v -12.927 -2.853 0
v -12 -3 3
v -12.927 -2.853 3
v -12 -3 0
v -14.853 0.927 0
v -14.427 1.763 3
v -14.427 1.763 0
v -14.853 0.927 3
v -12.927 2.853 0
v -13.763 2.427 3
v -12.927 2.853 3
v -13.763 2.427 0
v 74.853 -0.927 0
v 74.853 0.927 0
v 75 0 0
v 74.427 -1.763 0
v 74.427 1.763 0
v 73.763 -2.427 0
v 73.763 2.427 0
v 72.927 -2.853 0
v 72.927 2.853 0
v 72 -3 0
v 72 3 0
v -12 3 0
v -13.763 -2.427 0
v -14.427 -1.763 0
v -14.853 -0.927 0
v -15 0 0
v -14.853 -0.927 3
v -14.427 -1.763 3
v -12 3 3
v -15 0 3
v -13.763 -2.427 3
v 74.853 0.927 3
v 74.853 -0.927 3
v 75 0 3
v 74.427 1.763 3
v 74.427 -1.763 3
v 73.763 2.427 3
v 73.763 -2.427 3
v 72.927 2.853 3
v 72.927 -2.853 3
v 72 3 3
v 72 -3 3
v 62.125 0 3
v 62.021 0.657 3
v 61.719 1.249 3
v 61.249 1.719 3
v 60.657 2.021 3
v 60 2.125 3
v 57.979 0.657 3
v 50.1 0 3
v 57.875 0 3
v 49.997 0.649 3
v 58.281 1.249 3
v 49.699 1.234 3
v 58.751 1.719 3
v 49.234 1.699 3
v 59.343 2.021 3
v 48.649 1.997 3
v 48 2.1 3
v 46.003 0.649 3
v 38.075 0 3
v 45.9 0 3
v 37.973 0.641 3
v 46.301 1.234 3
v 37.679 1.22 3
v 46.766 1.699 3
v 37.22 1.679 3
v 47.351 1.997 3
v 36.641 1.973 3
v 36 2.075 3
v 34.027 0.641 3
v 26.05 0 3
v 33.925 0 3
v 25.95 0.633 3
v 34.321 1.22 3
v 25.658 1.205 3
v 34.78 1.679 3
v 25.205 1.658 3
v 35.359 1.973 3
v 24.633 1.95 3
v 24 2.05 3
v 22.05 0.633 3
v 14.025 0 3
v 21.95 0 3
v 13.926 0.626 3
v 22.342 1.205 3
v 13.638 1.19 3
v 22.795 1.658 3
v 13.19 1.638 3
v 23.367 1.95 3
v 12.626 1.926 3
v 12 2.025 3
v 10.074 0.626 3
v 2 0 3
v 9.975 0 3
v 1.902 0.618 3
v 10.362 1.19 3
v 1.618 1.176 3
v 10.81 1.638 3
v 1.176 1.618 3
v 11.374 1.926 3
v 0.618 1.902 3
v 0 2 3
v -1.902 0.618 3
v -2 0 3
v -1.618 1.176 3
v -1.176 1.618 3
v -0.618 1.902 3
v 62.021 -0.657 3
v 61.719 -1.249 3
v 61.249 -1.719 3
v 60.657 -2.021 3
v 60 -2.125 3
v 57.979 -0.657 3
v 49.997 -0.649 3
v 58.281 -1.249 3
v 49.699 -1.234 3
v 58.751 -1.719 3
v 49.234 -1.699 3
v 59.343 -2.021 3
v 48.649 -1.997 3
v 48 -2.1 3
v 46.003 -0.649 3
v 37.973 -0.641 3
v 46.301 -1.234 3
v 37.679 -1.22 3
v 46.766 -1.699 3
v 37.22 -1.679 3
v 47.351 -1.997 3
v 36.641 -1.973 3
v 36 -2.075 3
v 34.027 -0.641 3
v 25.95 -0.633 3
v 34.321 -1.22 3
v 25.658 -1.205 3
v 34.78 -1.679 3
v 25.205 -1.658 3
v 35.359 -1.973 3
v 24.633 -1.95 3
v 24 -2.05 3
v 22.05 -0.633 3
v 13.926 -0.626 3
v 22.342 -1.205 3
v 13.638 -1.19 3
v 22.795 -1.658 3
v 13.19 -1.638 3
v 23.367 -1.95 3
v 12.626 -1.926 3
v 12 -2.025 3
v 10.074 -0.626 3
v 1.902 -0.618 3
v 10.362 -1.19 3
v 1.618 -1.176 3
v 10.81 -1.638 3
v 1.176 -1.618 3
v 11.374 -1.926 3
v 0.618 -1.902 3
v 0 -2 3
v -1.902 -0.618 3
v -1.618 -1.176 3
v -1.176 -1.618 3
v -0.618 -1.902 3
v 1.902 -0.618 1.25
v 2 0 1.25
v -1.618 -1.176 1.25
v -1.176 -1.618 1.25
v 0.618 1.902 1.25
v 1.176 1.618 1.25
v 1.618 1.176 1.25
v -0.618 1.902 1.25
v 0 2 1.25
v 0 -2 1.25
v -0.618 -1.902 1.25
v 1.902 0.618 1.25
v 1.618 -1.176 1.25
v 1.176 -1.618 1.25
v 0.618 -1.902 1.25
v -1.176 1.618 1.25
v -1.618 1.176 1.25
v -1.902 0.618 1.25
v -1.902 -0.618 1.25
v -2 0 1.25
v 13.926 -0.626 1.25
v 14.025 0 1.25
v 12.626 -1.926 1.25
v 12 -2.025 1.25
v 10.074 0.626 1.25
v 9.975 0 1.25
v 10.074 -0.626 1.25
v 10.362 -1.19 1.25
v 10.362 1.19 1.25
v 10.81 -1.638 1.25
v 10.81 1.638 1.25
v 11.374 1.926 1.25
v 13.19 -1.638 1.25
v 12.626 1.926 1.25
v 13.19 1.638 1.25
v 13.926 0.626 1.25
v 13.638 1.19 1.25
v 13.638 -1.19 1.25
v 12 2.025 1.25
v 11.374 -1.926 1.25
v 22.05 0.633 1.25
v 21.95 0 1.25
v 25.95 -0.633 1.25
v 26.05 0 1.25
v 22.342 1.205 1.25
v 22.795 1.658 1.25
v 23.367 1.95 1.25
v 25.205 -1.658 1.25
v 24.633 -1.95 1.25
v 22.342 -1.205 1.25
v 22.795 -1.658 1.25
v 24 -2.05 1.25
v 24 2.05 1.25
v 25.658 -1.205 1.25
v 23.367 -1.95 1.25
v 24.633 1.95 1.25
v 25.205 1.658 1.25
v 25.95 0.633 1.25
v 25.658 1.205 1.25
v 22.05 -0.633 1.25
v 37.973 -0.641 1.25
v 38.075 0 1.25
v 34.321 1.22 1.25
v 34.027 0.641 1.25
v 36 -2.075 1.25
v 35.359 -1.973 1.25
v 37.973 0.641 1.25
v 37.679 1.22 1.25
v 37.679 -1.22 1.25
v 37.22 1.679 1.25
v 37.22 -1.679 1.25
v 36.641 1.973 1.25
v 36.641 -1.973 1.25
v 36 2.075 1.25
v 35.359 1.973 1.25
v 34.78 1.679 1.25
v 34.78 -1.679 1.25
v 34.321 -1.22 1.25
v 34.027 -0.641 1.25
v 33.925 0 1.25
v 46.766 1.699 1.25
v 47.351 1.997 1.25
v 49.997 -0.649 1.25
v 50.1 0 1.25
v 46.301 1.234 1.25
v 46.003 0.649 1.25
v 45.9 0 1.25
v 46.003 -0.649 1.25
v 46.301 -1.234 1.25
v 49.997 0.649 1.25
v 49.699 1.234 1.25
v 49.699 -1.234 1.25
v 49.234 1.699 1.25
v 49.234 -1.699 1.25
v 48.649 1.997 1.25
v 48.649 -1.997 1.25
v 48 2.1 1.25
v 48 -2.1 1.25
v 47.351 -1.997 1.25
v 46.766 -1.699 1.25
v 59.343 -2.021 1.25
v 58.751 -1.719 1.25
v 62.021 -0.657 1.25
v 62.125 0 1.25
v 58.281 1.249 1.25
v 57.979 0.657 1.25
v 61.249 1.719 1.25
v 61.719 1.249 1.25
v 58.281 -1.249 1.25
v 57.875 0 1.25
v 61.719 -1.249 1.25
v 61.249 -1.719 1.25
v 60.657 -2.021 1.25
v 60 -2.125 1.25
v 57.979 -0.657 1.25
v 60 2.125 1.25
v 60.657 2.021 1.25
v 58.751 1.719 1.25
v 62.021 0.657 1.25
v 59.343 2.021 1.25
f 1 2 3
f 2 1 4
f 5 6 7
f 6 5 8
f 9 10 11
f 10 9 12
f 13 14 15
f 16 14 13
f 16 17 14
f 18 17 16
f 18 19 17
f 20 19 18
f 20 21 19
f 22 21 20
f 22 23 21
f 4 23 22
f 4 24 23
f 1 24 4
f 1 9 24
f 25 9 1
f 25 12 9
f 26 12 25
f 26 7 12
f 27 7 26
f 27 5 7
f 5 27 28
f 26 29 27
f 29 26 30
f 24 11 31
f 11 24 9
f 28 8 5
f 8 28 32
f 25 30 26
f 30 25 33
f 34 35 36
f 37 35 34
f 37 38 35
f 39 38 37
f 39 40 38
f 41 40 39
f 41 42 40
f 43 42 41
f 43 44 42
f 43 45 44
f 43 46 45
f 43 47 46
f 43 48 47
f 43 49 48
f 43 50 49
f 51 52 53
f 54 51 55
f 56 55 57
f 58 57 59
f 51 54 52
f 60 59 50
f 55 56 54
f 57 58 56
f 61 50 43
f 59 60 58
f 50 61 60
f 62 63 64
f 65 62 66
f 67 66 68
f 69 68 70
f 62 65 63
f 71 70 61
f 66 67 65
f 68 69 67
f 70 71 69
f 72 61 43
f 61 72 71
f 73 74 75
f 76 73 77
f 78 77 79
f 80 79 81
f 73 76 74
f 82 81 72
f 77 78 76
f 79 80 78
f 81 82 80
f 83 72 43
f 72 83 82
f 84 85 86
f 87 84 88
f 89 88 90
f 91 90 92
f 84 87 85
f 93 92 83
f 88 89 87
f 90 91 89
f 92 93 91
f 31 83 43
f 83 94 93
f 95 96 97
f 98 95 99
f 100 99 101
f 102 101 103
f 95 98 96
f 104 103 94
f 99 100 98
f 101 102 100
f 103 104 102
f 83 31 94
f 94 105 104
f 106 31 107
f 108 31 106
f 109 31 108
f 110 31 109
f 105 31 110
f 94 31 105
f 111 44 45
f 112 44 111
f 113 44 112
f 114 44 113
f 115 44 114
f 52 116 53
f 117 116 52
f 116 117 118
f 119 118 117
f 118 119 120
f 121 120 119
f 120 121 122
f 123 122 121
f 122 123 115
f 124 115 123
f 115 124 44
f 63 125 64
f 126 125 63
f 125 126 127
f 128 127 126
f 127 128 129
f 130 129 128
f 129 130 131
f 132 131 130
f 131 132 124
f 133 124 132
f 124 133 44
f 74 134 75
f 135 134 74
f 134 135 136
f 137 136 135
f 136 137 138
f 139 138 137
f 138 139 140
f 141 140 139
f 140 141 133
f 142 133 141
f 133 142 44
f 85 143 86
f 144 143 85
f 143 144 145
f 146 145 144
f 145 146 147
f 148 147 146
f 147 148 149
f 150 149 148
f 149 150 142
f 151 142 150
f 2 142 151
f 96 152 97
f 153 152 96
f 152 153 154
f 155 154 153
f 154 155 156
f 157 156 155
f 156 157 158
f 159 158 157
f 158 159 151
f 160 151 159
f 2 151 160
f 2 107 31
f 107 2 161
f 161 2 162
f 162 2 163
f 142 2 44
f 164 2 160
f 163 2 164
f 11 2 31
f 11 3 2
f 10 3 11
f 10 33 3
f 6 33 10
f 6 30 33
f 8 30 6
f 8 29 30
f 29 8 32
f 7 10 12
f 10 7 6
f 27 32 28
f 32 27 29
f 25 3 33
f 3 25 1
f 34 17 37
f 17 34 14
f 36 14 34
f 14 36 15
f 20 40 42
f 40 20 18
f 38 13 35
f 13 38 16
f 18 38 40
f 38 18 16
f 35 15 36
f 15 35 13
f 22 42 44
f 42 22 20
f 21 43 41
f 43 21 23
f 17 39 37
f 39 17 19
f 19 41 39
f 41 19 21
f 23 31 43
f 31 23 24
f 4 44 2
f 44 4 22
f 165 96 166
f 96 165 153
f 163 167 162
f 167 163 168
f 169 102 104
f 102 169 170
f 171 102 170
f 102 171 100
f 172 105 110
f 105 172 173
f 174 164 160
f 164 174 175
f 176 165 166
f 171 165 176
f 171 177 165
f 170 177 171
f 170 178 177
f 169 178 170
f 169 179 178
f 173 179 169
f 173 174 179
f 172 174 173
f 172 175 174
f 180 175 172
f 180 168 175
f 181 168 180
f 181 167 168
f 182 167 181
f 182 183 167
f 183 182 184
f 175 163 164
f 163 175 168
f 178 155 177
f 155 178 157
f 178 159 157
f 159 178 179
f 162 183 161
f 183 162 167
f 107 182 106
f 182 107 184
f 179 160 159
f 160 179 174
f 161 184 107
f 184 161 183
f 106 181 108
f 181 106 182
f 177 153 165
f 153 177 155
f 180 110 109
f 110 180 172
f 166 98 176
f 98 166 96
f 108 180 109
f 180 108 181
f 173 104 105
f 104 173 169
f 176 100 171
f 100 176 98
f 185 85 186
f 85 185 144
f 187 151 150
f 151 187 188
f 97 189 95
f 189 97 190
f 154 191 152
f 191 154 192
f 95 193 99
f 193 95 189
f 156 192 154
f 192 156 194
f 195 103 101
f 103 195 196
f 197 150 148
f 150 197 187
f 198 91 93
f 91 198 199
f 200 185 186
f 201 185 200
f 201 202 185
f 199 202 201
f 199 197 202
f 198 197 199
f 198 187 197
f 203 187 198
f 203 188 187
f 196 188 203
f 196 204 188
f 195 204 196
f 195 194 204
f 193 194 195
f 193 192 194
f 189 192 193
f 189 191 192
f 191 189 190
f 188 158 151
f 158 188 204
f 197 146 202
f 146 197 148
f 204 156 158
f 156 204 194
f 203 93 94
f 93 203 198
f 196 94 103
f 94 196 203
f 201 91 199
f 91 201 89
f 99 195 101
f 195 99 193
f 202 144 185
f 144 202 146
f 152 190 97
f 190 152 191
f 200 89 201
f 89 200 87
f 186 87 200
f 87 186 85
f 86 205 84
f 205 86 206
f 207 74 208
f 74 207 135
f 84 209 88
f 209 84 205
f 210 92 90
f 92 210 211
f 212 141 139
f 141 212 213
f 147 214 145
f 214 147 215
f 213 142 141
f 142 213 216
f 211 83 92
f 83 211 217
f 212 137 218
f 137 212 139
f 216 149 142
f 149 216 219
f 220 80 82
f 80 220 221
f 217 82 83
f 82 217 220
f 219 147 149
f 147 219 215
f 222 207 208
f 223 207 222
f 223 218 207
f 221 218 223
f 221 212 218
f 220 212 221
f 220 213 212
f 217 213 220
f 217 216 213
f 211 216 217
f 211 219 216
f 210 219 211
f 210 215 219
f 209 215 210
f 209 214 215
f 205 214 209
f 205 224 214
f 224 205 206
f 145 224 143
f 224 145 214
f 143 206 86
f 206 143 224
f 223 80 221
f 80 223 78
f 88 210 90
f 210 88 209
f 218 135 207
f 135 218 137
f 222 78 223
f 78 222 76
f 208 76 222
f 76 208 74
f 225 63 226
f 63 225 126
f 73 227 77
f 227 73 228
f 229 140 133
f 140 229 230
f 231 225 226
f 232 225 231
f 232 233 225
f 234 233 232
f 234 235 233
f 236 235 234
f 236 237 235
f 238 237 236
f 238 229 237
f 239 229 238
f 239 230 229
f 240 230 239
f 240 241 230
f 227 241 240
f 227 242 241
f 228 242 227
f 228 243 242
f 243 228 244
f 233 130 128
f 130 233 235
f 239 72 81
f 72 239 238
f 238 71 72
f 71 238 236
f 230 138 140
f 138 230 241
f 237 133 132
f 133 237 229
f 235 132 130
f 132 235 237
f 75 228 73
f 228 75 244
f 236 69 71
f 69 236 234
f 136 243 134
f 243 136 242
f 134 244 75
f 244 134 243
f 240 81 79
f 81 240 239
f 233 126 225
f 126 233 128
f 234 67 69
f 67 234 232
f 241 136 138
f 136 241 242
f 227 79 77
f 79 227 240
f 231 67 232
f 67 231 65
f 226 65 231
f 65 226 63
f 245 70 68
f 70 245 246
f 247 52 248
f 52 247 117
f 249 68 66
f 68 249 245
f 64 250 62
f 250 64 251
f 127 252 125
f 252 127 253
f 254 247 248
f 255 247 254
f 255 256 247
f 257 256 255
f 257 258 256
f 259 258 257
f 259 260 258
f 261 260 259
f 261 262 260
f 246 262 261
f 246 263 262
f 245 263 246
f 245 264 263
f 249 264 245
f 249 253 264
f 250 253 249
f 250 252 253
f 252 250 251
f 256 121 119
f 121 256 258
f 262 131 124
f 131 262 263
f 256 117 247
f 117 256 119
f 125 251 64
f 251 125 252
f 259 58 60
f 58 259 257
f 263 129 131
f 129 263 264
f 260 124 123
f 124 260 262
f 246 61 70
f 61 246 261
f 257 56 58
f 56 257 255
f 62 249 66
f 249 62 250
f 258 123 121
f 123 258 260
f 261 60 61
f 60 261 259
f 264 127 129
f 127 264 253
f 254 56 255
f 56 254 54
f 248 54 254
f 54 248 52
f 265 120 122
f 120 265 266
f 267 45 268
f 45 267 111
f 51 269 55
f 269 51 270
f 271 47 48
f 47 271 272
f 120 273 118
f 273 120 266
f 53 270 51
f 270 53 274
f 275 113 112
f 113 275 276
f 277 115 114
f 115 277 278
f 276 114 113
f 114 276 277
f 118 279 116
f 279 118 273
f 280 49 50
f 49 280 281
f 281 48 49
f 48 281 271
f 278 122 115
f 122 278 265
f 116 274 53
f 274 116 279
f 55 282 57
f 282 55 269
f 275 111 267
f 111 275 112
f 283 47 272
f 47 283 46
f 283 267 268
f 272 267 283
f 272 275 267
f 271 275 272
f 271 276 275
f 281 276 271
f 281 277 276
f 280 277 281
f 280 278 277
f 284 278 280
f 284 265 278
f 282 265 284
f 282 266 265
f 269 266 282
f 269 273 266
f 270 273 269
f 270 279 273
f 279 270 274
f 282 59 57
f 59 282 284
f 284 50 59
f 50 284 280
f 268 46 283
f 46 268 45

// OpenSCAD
//magnet test fit

// 4.15, 4.20, *4.25*(cold), 4.30, 4.35, 4.40
// 4.00, 4.05, 4.10, 4.15, 4.20, 4.25
step=0.05;
gap=12;
cols=6;
stripw=6;

mag_dia_min = 4.00;    // Diameter dimension of magnets
mag_depth = 1.75;  // Depth (height) dimenstion of magnets
mag_bury = 1.25;   // How deep to bury the magnets in the part

difference() {
    strip();
    holes();
}

module strip() {
    translate([-gap,0,0]) {
        cylinder(r=stripw/2, h=mag_bury + mag_depth, $fn=20);
    }
    translate([(gap + mag_dia_min) * cols - 2 * gap,0,0]) {
        cylinder(r=stripw/2, h=mag_bury + mag_depth, $fn=20);
    }
    translate([-gap, -stripw/2, 0])
        cube(size=[(gap + mag_dia_min) * cols - gap, stripw, mag_depth + mag_bury]);
}

module holes() {
    for (i = [0:1:cols-1]) {
        translate([i * gap,0,mag_bury]) {
            linear_extrude(mag_depth + 1) {
                circle(r=(mag_dia_min + (step * i))/2, $fn=20);
            }
        }
    }
}
